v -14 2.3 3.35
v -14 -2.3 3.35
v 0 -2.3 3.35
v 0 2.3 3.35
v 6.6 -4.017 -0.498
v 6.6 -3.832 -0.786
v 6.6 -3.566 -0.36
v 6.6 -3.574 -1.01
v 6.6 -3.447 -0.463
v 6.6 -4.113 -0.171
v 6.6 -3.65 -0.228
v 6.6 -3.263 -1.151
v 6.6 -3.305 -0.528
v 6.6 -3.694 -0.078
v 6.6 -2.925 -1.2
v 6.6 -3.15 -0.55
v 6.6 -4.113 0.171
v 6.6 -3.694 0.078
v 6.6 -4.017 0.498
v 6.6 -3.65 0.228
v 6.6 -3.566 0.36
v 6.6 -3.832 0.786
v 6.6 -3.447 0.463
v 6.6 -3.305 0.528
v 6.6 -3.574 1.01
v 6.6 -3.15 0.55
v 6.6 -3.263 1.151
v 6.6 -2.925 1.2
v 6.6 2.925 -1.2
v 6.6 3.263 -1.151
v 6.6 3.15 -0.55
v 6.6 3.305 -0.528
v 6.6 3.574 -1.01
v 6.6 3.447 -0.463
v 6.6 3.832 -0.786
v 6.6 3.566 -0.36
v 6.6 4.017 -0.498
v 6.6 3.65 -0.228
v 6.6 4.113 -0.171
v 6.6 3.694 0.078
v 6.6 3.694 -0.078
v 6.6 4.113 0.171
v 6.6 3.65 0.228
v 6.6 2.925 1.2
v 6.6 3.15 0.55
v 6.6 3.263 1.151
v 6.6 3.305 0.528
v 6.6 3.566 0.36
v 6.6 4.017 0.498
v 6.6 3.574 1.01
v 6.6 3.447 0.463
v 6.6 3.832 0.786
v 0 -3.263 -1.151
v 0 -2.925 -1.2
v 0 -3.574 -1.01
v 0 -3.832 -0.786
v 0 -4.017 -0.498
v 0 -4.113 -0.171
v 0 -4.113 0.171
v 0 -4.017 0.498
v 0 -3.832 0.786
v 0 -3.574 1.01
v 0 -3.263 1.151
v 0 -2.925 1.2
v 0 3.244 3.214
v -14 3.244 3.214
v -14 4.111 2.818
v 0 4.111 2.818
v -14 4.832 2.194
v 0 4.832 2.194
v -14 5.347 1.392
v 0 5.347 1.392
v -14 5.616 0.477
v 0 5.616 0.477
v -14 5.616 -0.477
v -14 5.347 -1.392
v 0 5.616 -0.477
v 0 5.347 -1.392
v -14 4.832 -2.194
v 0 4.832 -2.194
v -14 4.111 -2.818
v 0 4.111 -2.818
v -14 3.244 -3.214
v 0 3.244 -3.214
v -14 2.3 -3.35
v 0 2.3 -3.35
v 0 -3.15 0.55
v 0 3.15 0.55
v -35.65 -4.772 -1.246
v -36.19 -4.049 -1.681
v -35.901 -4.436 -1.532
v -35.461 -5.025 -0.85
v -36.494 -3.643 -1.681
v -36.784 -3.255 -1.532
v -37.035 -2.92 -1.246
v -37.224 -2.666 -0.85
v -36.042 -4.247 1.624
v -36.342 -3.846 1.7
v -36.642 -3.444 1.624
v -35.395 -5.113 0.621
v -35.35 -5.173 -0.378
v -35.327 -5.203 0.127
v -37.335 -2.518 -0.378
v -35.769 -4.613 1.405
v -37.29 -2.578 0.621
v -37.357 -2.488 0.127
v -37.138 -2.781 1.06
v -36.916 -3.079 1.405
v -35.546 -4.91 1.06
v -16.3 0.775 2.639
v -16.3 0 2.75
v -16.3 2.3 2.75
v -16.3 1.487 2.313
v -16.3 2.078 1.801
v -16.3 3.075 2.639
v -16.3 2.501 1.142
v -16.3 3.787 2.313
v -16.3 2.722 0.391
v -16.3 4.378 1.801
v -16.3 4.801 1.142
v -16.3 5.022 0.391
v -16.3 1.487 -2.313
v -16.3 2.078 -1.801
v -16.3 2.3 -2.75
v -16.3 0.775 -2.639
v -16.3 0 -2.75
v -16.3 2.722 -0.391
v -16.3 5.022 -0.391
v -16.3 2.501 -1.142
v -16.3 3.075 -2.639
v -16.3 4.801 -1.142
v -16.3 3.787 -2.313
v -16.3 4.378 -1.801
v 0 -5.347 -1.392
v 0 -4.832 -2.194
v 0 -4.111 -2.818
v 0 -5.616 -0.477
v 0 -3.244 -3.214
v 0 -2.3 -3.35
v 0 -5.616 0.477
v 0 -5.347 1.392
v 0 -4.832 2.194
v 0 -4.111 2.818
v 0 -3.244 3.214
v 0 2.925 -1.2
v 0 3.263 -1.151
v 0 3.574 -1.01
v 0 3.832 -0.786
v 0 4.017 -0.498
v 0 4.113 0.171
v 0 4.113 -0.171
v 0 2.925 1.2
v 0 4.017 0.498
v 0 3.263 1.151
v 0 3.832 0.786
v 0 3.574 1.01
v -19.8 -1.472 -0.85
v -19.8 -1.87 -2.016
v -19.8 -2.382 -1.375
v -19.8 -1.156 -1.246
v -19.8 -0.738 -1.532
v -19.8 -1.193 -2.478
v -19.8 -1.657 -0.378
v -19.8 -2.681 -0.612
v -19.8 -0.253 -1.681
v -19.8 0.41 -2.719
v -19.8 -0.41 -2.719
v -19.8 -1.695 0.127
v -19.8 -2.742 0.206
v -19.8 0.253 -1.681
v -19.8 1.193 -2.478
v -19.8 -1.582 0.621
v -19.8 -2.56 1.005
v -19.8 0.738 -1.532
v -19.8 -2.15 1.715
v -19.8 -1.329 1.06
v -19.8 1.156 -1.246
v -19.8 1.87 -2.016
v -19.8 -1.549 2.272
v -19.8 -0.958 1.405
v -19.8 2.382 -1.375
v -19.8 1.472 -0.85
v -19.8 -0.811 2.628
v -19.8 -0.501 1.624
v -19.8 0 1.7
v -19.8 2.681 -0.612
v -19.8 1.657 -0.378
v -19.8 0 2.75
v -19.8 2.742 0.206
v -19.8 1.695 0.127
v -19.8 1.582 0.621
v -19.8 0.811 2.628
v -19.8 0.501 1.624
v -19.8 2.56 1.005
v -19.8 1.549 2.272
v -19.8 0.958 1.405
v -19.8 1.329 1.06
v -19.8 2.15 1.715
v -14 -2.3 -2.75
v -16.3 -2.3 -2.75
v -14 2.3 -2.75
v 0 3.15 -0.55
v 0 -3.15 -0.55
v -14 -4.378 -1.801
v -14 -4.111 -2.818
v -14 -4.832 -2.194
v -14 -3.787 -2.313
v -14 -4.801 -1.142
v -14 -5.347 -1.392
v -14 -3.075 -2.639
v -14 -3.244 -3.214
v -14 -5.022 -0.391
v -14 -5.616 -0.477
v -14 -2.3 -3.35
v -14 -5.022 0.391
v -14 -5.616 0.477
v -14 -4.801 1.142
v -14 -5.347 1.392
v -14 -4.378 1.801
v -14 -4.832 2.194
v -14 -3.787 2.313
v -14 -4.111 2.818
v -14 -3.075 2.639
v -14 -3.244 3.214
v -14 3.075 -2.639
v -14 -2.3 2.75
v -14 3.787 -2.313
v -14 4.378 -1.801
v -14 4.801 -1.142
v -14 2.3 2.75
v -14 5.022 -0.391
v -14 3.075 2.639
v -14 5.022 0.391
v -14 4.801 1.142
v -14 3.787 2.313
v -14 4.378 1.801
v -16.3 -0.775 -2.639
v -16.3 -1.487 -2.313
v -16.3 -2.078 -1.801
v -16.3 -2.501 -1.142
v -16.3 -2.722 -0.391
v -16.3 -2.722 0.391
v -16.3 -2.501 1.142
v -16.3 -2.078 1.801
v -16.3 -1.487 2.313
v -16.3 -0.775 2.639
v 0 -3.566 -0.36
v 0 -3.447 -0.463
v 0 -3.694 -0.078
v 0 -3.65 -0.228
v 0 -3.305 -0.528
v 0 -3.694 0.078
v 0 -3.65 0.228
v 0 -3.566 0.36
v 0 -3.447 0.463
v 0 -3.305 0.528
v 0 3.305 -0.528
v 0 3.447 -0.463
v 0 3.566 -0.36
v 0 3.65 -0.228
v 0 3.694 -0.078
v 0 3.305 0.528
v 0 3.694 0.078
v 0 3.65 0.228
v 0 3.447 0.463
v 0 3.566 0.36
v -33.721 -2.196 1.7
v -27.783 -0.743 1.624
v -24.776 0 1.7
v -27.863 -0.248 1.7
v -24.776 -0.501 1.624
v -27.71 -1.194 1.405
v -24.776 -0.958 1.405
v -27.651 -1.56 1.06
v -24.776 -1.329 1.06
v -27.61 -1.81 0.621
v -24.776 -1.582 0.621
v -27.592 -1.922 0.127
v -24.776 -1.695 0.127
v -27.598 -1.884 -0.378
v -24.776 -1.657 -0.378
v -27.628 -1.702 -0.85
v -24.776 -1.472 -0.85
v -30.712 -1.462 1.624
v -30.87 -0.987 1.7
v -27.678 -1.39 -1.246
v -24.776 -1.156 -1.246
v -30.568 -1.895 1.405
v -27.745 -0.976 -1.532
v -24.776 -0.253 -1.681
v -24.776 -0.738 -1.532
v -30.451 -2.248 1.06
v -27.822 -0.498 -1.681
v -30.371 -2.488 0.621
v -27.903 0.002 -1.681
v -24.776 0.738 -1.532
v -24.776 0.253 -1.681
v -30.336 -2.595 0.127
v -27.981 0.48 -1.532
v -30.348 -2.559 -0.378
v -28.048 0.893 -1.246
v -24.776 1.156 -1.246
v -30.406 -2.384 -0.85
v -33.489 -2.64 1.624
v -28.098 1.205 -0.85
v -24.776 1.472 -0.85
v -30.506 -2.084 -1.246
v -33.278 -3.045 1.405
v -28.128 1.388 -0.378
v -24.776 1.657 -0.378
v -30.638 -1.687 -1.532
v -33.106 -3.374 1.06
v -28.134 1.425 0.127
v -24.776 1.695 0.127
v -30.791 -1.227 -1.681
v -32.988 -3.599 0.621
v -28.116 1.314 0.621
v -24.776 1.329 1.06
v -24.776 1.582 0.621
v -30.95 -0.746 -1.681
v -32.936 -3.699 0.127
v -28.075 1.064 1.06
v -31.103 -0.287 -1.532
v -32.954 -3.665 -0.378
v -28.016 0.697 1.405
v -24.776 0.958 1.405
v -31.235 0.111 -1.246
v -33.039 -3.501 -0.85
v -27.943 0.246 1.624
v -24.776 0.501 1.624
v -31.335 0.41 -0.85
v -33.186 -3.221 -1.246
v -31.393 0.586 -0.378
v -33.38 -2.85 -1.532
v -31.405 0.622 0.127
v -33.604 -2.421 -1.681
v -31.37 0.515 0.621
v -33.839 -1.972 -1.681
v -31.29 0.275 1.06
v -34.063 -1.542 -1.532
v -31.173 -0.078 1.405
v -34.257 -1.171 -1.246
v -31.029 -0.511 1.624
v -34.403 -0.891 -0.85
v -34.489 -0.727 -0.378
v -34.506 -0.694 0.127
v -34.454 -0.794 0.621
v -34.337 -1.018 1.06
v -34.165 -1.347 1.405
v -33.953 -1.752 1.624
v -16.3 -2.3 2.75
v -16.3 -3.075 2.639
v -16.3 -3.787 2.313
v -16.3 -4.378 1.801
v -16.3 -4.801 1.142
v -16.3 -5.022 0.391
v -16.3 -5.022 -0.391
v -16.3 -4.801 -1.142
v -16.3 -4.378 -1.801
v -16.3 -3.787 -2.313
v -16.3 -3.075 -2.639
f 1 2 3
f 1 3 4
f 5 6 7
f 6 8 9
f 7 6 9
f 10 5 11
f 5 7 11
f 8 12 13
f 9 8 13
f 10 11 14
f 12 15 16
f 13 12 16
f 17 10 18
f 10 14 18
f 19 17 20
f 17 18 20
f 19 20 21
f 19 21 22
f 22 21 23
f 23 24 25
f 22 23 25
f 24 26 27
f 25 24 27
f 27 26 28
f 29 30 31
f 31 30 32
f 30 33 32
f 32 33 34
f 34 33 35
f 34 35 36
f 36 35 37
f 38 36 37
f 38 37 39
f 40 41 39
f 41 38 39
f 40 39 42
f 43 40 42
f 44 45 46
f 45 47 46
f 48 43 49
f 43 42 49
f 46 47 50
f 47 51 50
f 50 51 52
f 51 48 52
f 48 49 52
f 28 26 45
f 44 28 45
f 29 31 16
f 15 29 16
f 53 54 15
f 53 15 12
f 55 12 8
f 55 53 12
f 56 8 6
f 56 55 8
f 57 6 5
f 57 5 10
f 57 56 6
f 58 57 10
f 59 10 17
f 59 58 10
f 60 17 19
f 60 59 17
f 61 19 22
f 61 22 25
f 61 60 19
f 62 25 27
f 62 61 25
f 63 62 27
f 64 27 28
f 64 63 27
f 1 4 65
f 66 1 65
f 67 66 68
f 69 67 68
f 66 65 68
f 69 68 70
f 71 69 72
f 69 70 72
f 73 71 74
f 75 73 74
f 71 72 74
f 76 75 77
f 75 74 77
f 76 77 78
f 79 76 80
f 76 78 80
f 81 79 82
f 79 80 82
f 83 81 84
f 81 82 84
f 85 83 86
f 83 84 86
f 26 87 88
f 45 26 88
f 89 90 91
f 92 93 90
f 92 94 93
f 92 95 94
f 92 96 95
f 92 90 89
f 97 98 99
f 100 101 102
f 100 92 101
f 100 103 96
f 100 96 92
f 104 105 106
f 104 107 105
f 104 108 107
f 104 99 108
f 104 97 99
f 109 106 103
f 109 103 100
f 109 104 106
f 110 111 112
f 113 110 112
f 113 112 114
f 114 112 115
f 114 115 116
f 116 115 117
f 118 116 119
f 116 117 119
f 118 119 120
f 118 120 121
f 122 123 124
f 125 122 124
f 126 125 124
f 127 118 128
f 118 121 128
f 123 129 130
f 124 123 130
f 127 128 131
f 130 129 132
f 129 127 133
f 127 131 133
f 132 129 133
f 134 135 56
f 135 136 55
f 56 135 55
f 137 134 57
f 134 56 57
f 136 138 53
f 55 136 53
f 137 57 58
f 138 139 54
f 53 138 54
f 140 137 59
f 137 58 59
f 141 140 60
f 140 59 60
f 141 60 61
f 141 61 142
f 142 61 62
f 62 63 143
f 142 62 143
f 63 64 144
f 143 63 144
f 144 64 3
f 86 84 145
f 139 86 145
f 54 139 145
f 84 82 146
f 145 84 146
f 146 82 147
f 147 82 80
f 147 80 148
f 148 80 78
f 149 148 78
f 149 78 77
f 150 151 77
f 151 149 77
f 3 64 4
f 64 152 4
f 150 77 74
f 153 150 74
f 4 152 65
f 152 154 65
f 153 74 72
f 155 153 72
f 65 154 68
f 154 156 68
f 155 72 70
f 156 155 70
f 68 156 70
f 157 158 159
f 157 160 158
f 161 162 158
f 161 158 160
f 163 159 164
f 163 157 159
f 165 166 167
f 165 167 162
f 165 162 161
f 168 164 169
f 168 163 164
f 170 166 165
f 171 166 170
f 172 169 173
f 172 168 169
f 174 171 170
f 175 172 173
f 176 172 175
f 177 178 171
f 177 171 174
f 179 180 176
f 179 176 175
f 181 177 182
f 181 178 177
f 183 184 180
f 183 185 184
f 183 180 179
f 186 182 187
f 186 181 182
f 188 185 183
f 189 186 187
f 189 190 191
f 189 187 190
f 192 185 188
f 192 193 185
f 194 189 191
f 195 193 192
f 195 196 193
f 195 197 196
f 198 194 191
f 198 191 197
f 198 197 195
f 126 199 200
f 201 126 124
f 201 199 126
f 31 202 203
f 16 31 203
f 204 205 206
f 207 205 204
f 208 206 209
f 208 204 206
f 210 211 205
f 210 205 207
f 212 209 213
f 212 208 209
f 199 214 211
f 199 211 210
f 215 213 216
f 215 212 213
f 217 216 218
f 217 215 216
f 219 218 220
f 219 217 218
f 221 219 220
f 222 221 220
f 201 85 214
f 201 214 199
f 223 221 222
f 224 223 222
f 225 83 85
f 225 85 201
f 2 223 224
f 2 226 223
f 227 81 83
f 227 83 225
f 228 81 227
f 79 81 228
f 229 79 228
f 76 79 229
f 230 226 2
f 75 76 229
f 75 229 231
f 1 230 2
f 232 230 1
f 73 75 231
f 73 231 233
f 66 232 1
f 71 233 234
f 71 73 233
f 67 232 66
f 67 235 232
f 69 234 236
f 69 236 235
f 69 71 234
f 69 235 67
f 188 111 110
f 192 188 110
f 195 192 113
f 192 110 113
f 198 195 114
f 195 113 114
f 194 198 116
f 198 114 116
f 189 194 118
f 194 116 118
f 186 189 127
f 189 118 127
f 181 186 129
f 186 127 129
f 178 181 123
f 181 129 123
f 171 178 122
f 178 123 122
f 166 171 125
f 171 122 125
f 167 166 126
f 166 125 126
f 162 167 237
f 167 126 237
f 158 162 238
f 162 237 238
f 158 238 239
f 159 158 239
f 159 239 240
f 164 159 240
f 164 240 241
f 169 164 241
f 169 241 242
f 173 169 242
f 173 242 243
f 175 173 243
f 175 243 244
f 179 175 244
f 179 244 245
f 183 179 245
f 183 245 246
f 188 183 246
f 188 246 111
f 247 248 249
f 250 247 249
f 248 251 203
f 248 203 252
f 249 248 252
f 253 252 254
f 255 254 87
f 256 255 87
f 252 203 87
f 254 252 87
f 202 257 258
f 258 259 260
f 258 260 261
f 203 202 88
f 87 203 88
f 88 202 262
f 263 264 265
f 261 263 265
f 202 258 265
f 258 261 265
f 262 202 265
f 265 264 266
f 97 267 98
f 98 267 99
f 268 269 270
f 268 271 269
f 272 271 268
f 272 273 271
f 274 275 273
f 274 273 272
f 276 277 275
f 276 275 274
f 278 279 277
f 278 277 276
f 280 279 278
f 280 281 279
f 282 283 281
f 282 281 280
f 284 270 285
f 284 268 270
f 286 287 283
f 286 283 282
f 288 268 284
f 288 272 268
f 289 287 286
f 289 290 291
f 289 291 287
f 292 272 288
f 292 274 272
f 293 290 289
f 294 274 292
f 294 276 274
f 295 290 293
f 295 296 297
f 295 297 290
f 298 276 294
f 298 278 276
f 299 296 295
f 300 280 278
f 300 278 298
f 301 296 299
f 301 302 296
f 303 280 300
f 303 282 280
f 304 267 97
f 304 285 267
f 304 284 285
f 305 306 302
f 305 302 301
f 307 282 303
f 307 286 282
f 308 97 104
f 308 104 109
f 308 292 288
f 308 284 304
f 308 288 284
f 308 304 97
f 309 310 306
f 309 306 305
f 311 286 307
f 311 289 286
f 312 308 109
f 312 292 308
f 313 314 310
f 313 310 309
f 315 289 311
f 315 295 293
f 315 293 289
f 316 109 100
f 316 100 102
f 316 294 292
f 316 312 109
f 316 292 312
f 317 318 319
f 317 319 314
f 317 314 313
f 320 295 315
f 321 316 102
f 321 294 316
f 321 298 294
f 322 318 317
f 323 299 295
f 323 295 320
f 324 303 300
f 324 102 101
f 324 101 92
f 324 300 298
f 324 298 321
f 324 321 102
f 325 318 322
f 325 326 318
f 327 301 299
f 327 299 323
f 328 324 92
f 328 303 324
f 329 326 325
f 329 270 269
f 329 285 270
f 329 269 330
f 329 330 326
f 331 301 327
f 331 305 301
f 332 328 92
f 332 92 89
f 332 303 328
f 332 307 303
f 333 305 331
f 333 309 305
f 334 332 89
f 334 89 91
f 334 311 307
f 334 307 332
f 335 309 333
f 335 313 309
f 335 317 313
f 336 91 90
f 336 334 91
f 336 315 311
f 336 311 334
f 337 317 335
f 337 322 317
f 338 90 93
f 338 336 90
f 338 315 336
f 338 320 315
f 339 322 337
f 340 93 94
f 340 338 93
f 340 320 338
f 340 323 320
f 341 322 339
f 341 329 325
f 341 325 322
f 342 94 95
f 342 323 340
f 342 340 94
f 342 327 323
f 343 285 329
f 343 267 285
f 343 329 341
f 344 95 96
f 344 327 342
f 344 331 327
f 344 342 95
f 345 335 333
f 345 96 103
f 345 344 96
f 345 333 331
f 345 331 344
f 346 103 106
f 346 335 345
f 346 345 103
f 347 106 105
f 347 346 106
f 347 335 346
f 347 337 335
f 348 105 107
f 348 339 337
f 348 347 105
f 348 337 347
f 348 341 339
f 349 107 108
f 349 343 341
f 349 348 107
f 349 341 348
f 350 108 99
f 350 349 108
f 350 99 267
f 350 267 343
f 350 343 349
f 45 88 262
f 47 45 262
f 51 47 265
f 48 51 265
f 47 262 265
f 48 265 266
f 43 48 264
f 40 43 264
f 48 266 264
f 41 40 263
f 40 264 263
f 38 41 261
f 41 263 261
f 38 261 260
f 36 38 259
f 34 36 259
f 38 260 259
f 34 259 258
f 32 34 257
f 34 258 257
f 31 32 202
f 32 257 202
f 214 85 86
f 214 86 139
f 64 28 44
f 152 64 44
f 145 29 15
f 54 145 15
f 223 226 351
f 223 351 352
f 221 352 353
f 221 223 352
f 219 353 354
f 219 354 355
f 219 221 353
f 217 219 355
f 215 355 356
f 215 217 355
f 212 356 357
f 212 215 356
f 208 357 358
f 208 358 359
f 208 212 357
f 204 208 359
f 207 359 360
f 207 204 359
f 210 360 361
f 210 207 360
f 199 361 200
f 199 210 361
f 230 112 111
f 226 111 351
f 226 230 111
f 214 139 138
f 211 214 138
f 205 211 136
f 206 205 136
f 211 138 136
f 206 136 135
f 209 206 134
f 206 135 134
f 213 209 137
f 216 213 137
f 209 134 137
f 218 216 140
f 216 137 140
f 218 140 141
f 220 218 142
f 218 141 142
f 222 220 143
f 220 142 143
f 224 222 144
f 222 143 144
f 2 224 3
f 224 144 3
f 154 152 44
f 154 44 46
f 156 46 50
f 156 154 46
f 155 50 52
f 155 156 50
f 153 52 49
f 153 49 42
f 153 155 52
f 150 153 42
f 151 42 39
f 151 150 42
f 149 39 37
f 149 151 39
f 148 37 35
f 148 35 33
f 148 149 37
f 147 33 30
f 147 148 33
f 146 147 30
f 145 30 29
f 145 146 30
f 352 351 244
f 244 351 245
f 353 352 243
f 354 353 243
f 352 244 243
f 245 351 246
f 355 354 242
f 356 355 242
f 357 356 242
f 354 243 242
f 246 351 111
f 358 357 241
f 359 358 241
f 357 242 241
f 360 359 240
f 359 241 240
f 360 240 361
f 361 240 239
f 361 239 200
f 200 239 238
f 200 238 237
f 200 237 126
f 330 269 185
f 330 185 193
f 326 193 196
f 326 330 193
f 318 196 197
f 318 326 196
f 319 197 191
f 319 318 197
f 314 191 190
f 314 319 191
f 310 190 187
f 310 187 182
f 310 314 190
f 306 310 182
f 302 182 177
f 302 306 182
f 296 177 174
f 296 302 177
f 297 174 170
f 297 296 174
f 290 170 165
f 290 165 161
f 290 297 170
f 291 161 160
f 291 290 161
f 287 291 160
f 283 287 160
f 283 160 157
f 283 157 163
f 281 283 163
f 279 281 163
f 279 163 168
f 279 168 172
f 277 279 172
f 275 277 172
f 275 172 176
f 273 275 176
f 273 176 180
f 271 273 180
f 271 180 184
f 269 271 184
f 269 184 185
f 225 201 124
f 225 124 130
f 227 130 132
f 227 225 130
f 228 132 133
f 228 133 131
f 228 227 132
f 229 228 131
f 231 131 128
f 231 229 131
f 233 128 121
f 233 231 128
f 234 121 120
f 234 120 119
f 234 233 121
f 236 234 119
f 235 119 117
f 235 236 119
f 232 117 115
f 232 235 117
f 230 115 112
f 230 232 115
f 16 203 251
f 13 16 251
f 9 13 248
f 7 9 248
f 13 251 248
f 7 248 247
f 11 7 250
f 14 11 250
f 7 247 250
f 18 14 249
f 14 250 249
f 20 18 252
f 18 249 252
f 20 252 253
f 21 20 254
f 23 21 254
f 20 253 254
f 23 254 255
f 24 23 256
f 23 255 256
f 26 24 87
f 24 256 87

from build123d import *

# Parameters (mm, degrees)
EXTRUDE_1_DEPTH = 14
EXTRUDE_2_DEPTH = 2.3
SKETCH_4_R      = 2.75
EXTRUDE_3_DEPTH = 3.5
SKETCH_5_R      = 1.7
EXTRUDE_4_DEPTH = 6.6


with BuildPart() as part:
    # Эскиз1 → Бобышка-Вытянуть1 (new body)
    with BuildSketch(Plane(origin=(0, 0, 0), x_dir=(0, 0, -1), z_dir=(1, 0, 0))):
        with BuildLine():
            Line((-3.35, -2.3), (-3.35, 2.3))
            ThreePointArc((-3.35, 2.3), (0, 5.65), (3.35, 2.3))
            Line((3.35, 2.3), (3.35, -2.3))
            ThreePointArc((3.35, -2.3), (0, -5.65), (-3.35, -2.3))
        make_face()
    extrude(amount=-EXTRUDE_1_DEPTH)

    # Эскиз3 → Бобышка-Вытянуть2 (add)
    with BuildSketch(Plane.ZY.offset(14)):
        with BuildLine():
            Line((2.75, 2.3), (2.75, -2.3))
            ThreePointArc((2.75, -2.3), (0, -5.05), (-2.75, -2.3))
            Line((-2.75, -2.3), (-2.75, 2.3))
            ThreePointArc((-2.75, 2.3), (0, 5.05), (2.75, 2.3))
        make_face()
    extrude(amount=EXTRUDE_2_DEPTH)

    # Эскиз4 → Бобышка-Вытянуть3 (add)
    with BuildSketch(Plane.ZY.offset(16.3)):
        Circle(SKETCH_4_R)
    extrude(amount=EXTRUDE_3_DEPTH)

    # По траектории1: sweep along a path in Эскиз6
    with BuildLine(Plane.XY) as sweep_1_path:
        Line((-19.8, 0), (-24.776161806, 0))
        ThreePointArc((-24.776161806, 0), (-30.870449905, -0.986593903), (-36.342181829, -3.845591055))
    # Эскиз5 → По траектории1 (sweep)
    with BuildSketch(Plane.ZY.offset(19.8)):
        Circle(SKETCH_5_R)
    sweep(path=sweep_1_path.line)

    # Эскиз7 → Бобышка-Вытянуть4 (add)
    with BuildSketch(Plane(origin=(0, 0, 0), x_dir=(0, 0, -1), z_dir=(1, 0, 0))):
        with BuildLine():
            Line((-1.2, -2.925), (-1.2, 2.925))
            ThreePointArc((-1.2, 2.925), (0, 4.125), (1.2, 2.925))
            Line((1.2, 2.925), (1.2, -2.925))
            ThreePointArc((1.2, -2.925), (0, -4.125), (-1.2, -2.925))
        make_face()
        with BuildLine():
            Line((-0.55, -3.15), (-0.55, 3.15))
            ThreePointArc((-0.55, 3.15), (0, 3.7), (0.55, 3.15))
            Line((0.55, 3.15), (0.55, -3.15))
            ThreePointArc((0.55, -3.15), (0, -3.7), (-0.55, -3.15))
        make_face(mode=Mode.SUBTRACT)
    extrude(amount=EXTRUDE_4_DEPTH)


solid = part.part
